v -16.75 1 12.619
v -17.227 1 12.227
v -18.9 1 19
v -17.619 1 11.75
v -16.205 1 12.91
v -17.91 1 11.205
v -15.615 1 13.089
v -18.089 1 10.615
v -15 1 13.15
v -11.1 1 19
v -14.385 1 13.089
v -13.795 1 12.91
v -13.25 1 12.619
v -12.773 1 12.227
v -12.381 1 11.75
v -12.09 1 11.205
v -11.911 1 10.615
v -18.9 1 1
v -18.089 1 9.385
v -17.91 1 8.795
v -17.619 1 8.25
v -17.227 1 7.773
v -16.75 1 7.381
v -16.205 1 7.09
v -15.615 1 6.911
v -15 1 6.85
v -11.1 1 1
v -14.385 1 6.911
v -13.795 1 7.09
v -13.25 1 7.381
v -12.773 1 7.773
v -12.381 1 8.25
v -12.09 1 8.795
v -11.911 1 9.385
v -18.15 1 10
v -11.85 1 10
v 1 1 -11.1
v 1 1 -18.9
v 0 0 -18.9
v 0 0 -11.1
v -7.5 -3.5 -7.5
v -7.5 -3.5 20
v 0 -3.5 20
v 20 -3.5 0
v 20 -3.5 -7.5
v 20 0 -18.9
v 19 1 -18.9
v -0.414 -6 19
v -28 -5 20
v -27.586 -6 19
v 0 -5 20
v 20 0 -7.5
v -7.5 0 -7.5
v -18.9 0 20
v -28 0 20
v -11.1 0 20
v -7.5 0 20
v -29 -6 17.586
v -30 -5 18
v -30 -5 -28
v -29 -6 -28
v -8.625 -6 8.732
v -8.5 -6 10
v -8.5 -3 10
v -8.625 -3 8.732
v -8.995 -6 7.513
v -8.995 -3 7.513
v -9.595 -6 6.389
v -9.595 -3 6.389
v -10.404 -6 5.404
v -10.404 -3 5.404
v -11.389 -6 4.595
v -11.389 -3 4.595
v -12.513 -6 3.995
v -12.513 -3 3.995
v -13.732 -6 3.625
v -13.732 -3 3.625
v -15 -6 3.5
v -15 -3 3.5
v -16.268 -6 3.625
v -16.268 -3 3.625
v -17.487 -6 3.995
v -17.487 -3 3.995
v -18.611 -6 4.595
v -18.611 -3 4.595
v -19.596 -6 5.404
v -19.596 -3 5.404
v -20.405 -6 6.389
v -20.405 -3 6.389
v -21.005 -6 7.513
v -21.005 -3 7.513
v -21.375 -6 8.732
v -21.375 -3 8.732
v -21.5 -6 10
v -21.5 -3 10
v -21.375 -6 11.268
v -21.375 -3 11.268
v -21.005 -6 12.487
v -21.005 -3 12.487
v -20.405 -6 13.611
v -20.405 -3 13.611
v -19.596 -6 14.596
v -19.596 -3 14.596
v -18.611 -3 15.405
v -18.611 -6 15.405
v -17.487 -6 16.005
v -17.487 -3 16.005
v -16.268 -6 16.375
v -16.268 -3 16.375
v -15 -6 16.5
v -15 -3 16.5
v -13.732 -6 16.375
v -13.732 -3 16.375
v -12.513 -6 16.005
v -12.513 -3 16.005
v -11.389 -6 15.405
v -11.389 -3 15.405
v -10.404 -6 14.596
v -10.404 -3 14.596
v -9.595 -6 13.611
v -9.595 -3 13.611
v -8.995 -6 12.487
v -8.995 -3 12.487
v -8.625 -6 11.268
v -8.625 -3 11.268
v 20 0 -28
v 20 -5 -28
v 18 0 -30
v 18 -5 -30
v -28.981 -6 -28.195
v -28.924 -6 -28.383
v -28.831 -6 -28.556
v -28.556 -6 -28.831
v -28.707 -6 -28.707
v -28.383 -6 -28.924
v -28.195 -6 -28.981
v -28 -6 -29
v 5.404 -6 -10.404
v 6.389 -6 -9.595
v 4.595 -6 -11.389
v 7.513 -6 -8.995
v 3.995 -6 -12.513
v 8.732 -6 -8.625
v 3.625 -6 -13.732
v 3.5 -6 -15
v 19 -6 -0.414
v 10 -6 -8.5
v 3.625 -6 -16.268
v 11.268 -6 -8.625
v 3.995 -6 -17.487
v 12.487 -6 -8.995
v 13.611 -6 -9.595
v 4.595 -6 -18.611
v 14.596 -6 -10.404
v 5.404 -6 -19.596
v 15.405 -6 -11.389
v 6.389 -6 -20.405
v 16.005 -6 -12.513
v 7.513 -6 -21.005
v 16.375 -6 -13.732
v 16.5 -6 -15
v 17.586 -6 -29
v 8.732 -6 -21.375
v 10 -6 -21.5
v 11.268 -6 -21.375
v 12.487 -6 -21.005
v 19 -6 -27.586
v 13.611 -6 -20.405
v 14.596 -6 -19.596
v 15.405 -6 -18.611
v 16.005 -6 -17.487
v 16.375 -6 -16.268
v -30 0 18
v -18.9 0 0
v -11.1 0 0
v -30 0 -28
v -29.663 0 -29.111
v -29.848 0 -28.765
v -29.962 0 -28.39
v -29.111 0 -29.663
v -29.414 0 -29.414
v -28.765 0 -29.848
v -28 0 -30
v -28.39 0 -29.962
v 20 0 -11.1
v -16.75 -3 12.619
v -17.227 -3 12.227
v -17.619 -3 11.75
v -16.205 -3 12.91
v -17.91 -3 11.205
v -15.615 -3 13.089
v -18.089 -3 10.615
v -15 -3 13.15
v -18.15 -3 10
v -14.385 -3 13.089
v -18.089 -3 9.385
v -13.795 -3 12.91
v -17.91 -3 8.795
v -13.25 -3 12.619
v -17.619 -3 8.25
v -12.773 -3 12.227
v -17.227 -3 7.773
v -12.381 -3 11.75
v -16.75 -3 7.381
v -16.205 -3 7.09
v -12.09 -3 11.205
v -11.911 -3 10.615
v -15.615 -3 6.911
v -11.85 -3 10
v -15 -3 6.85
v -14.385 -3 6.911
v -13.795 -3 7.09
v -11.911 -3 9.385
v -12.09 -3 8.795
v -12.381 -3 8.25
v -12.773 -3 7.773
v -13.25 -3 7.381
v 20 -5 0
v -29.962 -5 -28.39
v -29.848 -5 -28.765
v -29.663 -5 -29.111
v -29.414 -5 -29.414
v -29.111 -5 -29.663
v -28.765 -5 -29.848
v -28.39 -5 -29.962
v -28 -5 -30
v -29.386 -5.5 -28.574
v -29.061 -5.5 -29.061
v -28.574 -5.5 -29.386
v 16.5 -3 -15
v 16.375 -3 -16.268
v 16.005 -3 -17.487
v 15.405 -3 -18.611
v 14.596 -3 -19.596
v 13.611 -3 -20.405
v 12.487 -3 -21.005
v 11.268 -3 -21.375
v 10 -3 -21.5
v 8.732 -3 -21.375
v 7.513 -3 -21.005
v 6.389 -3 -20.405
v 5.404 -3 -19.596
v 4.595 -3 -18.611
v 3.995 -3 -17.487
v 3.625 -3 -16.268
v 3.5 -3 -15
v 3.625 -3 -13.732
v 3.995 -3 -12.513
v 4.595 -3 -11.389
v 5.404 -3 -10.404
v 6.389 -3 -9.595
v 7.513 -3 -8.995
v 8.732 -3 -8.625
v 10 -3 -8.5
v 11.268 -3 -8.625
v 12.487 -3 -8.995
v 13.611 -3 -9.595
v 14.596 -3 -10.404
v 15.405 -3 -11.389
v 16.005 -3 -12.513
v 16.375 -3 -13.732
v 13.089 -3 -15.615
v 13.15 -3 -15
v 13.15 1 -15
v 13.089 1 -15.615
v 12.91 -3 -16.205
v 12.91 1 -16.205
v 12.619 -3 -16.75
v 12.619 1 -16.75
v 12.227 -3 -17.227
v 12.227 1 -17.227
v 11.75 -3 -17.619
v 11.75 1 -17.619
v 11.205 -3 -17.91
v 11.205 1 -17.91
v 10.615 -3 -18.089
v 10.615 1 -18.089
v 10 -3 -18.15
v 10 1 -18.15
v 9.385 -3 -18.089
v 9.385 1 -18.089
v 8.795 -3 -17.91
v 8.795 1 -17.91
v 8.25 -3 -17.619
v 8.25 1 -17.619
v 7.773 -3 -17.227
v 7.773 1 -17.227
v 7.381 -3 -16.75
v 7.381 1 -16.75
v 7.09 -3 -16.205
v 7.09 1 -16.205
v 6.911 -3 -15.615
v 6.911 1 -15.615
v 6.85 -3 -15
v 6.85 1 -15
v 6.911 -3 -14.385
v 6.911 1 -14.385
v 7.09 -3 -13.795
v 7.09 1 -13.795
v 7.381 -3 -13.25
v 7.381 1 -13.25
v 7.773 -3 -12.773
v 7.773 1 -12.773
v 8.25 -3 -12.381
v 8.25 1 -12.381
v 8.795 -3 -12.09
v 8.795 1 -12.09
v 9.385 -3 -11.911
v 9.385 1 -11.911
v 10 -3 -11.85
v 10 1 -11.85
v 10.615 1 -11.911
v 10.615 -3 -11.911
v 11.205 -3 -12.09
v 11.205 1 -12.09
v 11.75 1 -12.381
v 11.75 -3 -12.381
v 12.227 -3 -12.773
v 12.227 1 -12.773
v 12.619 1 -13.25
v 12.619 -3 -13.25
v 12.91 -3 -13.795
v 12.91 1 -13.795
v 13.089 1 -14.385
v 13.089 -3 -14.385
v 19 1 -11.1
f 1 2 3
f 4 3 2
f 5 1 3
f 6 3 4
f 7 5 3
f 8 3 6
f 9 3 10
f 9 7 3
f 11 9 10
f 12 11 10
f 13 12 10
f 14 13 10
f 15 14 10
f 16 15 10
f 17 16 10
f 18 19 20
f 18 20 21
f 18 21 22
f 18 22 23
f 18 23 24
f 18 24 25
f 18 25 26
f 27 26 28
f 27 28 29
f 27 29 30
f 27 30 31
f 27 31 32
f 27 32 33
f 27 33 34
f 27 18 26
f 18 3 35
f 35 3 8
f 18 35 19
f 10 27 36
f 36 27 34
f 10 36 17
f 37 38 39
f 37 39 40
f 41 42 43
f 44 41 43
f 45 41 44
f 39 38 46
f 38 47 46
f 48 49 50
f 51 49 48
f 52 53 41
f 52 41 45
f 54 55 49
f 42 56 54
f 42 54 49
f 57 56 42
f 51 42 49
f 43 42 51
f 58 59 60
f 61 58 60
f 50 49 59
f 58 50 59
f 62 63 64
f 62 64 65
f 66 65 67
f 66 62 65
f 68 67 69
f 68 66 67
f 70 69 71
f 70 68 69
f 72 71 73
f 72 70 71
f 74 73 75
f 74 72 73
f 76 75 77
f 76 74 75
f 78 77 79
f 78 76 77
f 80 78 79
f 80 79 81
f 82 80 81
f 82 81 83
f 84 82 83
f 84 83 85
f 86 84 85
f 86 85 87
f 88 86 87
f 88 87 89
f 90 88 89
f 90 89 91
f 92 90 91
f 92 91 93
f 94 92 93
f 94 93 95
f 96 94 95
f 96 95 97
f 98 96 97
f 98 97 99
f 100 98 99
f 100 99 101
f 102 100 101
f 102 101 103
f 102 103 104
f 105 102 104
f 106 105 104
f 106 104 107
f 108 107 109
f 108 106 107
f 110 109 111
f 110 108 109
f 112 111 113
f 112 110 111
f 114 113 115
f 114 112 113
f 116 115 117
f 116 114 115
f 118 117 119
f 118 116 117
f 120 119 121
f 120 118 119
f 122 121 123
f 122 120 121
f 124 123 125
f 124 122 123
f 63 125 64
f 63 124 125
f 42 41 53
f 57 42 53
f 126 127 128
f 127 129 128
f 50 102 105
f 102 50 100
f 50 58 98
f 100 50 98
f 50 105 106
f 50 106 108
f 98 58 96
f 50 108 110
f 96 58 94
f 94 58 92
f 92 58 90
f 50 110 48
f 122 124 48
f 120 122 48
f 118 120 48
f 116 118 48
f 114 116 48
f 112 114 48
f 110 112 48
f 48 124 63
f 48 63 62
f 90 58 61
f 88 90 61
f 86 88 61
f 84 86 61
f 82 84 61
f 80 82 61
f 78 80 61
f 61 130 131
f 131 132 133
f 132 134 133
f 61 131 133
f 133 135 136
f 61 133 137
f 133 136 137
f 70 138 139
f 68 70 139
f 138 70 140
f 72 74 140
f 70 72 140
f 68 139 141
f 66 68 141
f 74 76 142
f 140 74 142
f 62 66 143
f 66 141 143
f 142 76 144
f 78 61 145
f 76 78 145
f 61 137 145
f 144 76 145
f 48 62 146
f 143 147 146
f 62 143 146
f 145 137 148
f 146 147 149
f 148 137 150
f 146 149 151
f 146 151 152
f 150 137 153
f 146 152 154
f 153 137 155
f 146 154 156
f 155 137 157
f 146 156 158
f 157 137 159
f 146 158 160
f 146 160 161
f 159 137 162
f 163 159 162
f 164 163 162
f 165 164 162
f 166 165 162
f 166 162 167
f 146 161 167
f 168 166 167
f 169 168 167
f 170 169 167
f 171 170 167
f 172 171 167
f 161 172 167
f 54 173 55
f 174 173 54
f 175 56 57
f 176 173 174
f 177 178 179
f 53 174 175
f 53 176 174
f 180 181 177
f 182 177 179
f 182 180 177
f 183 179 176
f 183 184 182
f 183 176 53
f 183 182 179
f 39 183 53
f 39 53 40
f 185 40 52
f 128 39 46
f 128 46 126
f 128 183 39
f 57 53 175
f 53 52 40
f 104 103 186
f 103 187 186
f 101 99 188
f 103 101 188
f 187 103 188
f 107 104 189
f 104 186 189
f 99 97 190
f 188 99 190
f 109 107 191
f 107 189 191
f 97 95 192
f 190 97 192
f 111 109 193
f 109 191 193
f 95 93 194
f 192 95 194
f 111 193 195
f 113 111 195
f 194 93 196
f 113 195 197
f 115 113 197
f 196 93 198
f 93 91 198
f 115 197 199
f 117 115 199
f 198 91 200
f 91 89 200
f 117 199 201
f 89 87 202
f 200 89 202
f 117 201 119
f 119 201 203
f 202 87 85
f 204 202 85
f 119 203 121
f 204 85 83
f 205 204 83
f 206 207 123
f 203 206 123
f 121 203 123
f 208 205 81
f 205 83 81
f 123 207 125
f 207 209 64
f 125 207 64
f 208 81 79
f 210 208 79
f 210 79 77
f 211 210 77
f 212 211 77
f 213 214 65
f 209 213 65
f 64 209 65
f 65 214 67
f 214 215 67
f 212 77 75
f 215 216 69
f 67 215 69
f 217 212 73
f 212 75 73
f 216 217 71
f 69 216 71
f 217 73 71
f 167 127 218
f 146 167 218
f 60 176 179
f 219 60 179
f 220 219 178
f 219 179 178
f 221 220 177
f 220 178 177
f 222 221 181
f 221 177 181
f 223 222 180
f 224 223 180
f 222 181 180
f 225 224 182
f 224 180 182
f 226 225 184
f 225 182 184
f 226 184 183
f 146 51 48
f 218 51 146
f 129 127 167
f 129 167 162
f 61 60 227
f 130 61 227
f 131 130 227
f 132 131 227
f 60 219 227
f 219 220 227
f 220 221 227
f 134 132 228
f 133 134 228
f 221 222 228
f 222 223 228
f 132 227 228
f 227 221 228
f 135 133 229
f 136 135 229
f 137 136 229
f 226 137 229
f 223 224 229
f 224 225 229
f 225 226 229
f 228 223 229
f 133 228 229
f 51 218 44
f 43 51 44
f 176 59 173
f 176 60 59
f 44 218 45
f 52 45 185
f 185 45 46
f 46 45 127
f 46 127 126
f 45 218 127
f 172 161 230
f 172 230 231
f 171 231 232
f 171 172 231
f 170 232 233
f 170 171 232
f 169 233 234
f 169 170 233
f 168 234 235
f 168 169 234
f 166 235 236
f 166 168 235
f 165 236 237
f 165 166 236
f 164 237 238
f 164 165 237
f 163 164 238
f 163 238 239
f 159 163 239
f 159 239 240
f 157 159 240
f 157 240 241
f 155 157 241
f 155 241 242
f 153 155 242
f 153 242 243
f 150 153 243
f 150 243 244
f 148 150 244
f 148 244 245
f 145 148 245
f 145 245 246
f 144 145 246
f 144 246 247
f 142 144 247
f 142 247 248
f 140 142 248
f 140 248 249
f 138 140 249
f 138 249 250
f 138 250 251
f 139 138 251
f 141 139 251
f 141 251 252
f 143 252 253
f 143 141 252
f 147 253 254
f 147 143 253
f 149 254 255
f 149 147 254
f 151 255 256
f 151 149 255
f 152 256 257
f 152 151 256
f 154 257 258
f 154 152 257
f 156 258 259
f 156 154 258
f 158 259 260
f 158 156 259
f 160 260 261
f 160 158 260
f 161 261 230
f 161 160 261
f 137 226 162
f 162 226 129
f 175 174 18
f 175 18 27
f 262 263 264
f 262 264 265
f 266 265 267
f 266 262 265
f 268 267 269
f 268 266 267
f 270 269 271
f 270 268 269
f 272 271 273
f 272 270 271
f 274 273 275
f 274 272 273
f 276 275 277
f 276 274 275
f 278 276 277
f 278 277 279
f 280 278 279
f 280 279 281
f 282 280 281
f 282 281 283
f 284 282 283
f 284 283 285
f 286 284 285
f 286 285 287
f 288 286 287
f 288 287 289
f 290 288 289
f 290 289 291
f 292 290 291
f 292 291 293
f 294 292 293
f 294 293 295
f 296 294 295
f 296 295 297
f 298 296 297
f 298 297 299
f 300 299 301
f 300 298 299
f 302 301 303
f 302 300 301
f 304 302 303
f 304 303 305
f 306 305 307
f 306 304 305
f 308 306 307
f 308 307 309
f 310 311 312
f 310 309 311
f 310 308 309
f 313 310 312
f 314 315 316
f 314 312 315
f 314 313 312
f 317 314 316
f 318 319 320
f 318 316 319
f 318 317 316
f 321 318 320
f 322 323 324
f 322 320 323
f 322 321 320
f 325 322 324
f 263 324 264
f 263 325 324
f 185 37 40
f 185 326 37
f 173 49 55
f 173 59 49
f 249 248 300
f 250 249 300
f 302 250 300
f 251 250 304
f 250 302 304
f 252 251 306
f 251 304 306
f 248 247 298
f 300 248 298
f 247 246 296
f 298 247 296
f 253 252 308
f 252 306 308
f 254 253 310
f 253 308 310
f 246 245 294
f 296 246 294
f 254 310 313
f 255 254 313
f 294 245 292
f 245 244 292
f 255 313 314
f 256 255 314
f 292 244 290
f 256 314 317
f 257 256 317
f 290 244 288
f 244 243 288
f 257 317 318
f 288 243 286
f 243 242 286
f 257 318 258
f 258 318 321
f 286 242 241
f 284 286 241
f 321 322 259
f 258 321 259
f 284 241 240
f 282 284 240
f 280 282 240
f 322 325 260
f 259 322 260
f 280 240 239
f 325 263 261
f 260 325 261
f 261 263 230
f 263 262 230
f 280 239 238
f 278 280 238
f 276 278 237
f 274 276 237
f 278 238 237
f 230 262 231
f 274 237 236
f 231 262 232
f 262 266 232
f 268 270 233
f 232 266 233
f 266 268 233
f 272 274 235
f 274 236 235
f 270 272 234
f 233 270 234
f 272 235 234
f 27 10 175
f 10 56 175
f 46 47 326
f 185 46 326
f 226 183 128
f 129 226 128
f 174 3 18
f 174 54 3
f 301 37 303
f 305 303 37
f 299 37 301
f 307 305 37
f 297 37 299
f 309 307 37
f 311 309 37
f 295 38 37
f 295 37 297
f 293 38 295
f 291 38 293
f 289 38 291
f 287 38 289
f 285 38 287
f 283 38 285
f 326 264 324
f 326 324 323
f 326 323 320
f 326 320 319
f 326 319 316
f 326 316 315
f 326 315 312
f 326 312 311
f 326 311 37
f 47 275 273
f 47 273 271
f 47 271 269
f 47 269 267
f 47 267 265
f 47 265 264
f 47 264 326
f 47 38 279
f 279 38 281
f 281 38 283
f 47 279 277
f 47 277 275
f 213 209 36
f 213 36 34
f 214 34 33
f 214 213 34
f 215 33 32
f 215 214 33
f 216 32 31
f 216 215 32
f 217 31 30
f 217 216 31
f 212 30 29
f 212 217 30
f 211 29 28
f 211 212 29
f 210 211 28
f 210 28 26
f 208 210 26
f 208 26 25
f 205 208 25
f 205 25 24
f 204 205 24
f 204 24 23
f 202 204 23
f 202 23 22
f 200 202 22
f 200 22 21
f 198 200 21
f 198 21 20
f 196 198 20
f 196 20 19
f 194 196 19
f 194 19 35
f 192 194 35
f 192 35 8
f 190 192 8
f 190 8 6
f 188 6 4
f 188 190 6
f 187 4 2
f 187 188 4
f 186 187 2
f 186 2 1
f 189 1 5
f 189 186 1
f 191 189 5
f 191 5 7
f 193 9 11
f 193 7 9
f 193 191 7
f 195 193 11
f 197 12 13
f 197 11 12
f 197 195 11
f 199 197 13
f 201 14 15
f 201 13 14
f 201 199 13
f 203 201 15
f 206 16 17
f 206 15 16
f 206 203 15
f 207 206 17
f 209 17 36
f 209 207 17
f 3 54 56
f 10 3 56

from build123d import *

# Parameters (mm, degrees)
CYLINDER009_R     = 3.15
CYLINDER009_DEPTH = 10
CYLINDER008_R     = 3.15
CYLINDER008_DEPTH = 10
CYLINDER006_R     = 6.5
CYLINDER006_DEPTH = 10
CYLINDER007_R     = 6.5
CYLINDER007_DEPTH = 10
BOX010_W          = 28
BOX010_H          = 16
BOX010_DEPTH      = 28
BOX008_W          = 50
BOX008_H          = 6
BOX008_DEPTH      = 50
FILLET_R          = 2
CHAMFER014_SIZE   = 20
CHAMFER015_SIZE   = 2
CHAMFER016_SIZE   = 1
BOX007_W          = 7.8
BOX007_H          = 2
BOX007_DEPTH      = 20
CHAMFER010_SIZE   = 1
BOX009_W          = 20
BOX009_H          = 2
BOX009_DEPTH      = 7.8
CHAMFER013_SIZE   = 1


with BuildPart() as cylinder009:
    # Cylinder009 → Cylinder009 (new body)
    with BuildSketch(Plane(origin=(10, -7, -15), x_dir=(1, 0, 0), z_dir=(0, 1, 0))):
        Circle(CYLINDER009_R)
    extrude(amount=CYLINDER009_DEPTH)


with BuildPart() as fusion005:
    # Cylinder008 → Cylinder008 (new body)
    with BuildSketch(Plane(origin=(-15, -7, 10), x_dir=(1, 0, 0), z_dir=(0, 1, 0))):
        Circle(CYLINDER008_R)
    extrude(amount=CYLINDER008_DEPTH)

    # Fusion005: union Cylinder009
    add(cylinder009.part)


with BuildPart() as cylinder006:
    # Cylinder006 → Cylinder006 (new body)
    with BuildSketch(Plane(origin=(10, -16, -15), x_dir=(1, 0, 0), z_dir=(0, 1, 0))):
        Circle(CYLINDER006_R)
    extrude(amount=CYLINDER006_DEPTH)


with BuildPart() as fusion006:
    # Cylinder007 → Cylinder007 (new body)
    with BuildSketch(Plane(origin=(-15, -16, 10), x_dir=(1, 0, 0), z_dir=(0, 1, 0))):
        Circle(CYLINDER007_R)
    extrude(amount=CYLINDER007_DEPTH)

    # Fusion006: union Cylinder006
    add(cylinder006.part)


with BuildPart() as fusion006_1:
    # Fusion006 placement: moved
    add(fusion006.part.moved(Location((0, 3, 0))))


with BuildPart() as cube010:
    # Box010 → Box010 (new body)
    with BuildSketch(Plane(origin=(-7.5, -3.5, -7.5), x_dir=(1, 0, 0), z_dir=(0, 0, 1))):
        with Locations((14, 8)):
            Rectangle(BOX010_W, BOX010_H)
    extrude(amount=BOX010_DEPTH)


with BuildPart() as chamfer016:
    # Box008 → Box008 (new body)
    with BuildSketch(Plane(origin=(-30, -6, -30), x_dir=(1, 0, 0), z_dir=(0, 0, 1))):
        with Locations((25, 3)):
            Rectangle(BOX008_W, BOX008_H)
    extrude(amount=BOX008_DEPTH)

    # Fillet
    fillet_edges = [chamfer016.edges().sort_by_distance(p)[0] for p in [
        (-30, -3, -30),
    ]]
    fillet(fillet_edges, radius=FILLET_R)

    # Chamfer014
    chamfer014_edges = [chamfer016.edges().sort_by_distance(p)[0] for p in [
        (20, -3, 20),
    ]]
    chamfer(chamfer014_edges, length=CHAMFER014_SIZE)

    # Chamfer015
    chamfer015_edges = [chamfer016.edges().sort_by_distance(p)[0] for p in [
        (20, -3, -30),
        (-30, -3, 20),
    ]]
    chamfer(chamfer015_edges, length=CHAMFER015_SIZE)

    # Cut002008002: cut Cube010
    add(cube010.part, mode=Mode.SUBTRACT)

    # Chamfer016
    chamfer016_edges = [chamfer016.edges().sort_by_distance(p)[0] for p in [
        (20, -6, -14),
        (19, -6, -29),
        (10, -6, 10),
        (-5, -6, -30),
        (-14, -6, 20),
        (-29.414214, -6, -29.414214),
        (-29, -6, 19),
        (-30, -6, -5),
    ]]
    chamfer(chamfer016_edges, length=CHAMFER016_SIZE)


with BuildPart() as chamfer010:
    # Box007 → Box007 (new body)
    with BuildSketch(Plane(origin=(-18.9, -1, 0), x_dir=(1, 0, 0), z_dir=(0, 0, 1))):
        with Locations((3.9, 1)):
            Rectangle(BOX007_W, BOX007_H)
    extrude(amount=BOX007_DEPTH)

    # Chamfer010
    chamfer010_edges = [chamfer010.edges().sort_by_distance(p)[0] for p in [
        (-15, 1, 0),
        (-15, 1, 20),
    ]]
    chamfer(chamfer010_edges, length=CHAMFER010_SIZE)


with BuildPart() as top_corner_clip:
    # Box009 → Box009 (new body)
    with BuildSketch(Plane(origin=(0, -1, -18.9), x_dir=(1, 0, 0), z_dir=(0, 0, 1))):
        with Locations((10, 1)):
            Rectangle(BOX009_W, BOX009_H)
    extrude(amount=BOX009_DEPTH)

    # Chamfer013
    chamfer013_edges = [top_corner_clip.edges().sort_by_distance(p)[0] for p in [
        (0, 1, -15),
        (20, 1, -15),
    ]]
    chamfer(chamfer013_edges, length=CHAMFER013_SIZE)

    # Fusion007: union Chamfer010
    add(chamfer010.part)

    # Fusion008: union Chamfer016
    add(chamfer016.part)

    # Cut002008003: cut Fusion006
    add(fusion006_1.part, mode=Mode.SUBTRACT)

    # Cut002008004: cut Fusion005
    add(fusion005.part, mode=Mode.SUBTRACT)


solid = top_corner_clip.part
